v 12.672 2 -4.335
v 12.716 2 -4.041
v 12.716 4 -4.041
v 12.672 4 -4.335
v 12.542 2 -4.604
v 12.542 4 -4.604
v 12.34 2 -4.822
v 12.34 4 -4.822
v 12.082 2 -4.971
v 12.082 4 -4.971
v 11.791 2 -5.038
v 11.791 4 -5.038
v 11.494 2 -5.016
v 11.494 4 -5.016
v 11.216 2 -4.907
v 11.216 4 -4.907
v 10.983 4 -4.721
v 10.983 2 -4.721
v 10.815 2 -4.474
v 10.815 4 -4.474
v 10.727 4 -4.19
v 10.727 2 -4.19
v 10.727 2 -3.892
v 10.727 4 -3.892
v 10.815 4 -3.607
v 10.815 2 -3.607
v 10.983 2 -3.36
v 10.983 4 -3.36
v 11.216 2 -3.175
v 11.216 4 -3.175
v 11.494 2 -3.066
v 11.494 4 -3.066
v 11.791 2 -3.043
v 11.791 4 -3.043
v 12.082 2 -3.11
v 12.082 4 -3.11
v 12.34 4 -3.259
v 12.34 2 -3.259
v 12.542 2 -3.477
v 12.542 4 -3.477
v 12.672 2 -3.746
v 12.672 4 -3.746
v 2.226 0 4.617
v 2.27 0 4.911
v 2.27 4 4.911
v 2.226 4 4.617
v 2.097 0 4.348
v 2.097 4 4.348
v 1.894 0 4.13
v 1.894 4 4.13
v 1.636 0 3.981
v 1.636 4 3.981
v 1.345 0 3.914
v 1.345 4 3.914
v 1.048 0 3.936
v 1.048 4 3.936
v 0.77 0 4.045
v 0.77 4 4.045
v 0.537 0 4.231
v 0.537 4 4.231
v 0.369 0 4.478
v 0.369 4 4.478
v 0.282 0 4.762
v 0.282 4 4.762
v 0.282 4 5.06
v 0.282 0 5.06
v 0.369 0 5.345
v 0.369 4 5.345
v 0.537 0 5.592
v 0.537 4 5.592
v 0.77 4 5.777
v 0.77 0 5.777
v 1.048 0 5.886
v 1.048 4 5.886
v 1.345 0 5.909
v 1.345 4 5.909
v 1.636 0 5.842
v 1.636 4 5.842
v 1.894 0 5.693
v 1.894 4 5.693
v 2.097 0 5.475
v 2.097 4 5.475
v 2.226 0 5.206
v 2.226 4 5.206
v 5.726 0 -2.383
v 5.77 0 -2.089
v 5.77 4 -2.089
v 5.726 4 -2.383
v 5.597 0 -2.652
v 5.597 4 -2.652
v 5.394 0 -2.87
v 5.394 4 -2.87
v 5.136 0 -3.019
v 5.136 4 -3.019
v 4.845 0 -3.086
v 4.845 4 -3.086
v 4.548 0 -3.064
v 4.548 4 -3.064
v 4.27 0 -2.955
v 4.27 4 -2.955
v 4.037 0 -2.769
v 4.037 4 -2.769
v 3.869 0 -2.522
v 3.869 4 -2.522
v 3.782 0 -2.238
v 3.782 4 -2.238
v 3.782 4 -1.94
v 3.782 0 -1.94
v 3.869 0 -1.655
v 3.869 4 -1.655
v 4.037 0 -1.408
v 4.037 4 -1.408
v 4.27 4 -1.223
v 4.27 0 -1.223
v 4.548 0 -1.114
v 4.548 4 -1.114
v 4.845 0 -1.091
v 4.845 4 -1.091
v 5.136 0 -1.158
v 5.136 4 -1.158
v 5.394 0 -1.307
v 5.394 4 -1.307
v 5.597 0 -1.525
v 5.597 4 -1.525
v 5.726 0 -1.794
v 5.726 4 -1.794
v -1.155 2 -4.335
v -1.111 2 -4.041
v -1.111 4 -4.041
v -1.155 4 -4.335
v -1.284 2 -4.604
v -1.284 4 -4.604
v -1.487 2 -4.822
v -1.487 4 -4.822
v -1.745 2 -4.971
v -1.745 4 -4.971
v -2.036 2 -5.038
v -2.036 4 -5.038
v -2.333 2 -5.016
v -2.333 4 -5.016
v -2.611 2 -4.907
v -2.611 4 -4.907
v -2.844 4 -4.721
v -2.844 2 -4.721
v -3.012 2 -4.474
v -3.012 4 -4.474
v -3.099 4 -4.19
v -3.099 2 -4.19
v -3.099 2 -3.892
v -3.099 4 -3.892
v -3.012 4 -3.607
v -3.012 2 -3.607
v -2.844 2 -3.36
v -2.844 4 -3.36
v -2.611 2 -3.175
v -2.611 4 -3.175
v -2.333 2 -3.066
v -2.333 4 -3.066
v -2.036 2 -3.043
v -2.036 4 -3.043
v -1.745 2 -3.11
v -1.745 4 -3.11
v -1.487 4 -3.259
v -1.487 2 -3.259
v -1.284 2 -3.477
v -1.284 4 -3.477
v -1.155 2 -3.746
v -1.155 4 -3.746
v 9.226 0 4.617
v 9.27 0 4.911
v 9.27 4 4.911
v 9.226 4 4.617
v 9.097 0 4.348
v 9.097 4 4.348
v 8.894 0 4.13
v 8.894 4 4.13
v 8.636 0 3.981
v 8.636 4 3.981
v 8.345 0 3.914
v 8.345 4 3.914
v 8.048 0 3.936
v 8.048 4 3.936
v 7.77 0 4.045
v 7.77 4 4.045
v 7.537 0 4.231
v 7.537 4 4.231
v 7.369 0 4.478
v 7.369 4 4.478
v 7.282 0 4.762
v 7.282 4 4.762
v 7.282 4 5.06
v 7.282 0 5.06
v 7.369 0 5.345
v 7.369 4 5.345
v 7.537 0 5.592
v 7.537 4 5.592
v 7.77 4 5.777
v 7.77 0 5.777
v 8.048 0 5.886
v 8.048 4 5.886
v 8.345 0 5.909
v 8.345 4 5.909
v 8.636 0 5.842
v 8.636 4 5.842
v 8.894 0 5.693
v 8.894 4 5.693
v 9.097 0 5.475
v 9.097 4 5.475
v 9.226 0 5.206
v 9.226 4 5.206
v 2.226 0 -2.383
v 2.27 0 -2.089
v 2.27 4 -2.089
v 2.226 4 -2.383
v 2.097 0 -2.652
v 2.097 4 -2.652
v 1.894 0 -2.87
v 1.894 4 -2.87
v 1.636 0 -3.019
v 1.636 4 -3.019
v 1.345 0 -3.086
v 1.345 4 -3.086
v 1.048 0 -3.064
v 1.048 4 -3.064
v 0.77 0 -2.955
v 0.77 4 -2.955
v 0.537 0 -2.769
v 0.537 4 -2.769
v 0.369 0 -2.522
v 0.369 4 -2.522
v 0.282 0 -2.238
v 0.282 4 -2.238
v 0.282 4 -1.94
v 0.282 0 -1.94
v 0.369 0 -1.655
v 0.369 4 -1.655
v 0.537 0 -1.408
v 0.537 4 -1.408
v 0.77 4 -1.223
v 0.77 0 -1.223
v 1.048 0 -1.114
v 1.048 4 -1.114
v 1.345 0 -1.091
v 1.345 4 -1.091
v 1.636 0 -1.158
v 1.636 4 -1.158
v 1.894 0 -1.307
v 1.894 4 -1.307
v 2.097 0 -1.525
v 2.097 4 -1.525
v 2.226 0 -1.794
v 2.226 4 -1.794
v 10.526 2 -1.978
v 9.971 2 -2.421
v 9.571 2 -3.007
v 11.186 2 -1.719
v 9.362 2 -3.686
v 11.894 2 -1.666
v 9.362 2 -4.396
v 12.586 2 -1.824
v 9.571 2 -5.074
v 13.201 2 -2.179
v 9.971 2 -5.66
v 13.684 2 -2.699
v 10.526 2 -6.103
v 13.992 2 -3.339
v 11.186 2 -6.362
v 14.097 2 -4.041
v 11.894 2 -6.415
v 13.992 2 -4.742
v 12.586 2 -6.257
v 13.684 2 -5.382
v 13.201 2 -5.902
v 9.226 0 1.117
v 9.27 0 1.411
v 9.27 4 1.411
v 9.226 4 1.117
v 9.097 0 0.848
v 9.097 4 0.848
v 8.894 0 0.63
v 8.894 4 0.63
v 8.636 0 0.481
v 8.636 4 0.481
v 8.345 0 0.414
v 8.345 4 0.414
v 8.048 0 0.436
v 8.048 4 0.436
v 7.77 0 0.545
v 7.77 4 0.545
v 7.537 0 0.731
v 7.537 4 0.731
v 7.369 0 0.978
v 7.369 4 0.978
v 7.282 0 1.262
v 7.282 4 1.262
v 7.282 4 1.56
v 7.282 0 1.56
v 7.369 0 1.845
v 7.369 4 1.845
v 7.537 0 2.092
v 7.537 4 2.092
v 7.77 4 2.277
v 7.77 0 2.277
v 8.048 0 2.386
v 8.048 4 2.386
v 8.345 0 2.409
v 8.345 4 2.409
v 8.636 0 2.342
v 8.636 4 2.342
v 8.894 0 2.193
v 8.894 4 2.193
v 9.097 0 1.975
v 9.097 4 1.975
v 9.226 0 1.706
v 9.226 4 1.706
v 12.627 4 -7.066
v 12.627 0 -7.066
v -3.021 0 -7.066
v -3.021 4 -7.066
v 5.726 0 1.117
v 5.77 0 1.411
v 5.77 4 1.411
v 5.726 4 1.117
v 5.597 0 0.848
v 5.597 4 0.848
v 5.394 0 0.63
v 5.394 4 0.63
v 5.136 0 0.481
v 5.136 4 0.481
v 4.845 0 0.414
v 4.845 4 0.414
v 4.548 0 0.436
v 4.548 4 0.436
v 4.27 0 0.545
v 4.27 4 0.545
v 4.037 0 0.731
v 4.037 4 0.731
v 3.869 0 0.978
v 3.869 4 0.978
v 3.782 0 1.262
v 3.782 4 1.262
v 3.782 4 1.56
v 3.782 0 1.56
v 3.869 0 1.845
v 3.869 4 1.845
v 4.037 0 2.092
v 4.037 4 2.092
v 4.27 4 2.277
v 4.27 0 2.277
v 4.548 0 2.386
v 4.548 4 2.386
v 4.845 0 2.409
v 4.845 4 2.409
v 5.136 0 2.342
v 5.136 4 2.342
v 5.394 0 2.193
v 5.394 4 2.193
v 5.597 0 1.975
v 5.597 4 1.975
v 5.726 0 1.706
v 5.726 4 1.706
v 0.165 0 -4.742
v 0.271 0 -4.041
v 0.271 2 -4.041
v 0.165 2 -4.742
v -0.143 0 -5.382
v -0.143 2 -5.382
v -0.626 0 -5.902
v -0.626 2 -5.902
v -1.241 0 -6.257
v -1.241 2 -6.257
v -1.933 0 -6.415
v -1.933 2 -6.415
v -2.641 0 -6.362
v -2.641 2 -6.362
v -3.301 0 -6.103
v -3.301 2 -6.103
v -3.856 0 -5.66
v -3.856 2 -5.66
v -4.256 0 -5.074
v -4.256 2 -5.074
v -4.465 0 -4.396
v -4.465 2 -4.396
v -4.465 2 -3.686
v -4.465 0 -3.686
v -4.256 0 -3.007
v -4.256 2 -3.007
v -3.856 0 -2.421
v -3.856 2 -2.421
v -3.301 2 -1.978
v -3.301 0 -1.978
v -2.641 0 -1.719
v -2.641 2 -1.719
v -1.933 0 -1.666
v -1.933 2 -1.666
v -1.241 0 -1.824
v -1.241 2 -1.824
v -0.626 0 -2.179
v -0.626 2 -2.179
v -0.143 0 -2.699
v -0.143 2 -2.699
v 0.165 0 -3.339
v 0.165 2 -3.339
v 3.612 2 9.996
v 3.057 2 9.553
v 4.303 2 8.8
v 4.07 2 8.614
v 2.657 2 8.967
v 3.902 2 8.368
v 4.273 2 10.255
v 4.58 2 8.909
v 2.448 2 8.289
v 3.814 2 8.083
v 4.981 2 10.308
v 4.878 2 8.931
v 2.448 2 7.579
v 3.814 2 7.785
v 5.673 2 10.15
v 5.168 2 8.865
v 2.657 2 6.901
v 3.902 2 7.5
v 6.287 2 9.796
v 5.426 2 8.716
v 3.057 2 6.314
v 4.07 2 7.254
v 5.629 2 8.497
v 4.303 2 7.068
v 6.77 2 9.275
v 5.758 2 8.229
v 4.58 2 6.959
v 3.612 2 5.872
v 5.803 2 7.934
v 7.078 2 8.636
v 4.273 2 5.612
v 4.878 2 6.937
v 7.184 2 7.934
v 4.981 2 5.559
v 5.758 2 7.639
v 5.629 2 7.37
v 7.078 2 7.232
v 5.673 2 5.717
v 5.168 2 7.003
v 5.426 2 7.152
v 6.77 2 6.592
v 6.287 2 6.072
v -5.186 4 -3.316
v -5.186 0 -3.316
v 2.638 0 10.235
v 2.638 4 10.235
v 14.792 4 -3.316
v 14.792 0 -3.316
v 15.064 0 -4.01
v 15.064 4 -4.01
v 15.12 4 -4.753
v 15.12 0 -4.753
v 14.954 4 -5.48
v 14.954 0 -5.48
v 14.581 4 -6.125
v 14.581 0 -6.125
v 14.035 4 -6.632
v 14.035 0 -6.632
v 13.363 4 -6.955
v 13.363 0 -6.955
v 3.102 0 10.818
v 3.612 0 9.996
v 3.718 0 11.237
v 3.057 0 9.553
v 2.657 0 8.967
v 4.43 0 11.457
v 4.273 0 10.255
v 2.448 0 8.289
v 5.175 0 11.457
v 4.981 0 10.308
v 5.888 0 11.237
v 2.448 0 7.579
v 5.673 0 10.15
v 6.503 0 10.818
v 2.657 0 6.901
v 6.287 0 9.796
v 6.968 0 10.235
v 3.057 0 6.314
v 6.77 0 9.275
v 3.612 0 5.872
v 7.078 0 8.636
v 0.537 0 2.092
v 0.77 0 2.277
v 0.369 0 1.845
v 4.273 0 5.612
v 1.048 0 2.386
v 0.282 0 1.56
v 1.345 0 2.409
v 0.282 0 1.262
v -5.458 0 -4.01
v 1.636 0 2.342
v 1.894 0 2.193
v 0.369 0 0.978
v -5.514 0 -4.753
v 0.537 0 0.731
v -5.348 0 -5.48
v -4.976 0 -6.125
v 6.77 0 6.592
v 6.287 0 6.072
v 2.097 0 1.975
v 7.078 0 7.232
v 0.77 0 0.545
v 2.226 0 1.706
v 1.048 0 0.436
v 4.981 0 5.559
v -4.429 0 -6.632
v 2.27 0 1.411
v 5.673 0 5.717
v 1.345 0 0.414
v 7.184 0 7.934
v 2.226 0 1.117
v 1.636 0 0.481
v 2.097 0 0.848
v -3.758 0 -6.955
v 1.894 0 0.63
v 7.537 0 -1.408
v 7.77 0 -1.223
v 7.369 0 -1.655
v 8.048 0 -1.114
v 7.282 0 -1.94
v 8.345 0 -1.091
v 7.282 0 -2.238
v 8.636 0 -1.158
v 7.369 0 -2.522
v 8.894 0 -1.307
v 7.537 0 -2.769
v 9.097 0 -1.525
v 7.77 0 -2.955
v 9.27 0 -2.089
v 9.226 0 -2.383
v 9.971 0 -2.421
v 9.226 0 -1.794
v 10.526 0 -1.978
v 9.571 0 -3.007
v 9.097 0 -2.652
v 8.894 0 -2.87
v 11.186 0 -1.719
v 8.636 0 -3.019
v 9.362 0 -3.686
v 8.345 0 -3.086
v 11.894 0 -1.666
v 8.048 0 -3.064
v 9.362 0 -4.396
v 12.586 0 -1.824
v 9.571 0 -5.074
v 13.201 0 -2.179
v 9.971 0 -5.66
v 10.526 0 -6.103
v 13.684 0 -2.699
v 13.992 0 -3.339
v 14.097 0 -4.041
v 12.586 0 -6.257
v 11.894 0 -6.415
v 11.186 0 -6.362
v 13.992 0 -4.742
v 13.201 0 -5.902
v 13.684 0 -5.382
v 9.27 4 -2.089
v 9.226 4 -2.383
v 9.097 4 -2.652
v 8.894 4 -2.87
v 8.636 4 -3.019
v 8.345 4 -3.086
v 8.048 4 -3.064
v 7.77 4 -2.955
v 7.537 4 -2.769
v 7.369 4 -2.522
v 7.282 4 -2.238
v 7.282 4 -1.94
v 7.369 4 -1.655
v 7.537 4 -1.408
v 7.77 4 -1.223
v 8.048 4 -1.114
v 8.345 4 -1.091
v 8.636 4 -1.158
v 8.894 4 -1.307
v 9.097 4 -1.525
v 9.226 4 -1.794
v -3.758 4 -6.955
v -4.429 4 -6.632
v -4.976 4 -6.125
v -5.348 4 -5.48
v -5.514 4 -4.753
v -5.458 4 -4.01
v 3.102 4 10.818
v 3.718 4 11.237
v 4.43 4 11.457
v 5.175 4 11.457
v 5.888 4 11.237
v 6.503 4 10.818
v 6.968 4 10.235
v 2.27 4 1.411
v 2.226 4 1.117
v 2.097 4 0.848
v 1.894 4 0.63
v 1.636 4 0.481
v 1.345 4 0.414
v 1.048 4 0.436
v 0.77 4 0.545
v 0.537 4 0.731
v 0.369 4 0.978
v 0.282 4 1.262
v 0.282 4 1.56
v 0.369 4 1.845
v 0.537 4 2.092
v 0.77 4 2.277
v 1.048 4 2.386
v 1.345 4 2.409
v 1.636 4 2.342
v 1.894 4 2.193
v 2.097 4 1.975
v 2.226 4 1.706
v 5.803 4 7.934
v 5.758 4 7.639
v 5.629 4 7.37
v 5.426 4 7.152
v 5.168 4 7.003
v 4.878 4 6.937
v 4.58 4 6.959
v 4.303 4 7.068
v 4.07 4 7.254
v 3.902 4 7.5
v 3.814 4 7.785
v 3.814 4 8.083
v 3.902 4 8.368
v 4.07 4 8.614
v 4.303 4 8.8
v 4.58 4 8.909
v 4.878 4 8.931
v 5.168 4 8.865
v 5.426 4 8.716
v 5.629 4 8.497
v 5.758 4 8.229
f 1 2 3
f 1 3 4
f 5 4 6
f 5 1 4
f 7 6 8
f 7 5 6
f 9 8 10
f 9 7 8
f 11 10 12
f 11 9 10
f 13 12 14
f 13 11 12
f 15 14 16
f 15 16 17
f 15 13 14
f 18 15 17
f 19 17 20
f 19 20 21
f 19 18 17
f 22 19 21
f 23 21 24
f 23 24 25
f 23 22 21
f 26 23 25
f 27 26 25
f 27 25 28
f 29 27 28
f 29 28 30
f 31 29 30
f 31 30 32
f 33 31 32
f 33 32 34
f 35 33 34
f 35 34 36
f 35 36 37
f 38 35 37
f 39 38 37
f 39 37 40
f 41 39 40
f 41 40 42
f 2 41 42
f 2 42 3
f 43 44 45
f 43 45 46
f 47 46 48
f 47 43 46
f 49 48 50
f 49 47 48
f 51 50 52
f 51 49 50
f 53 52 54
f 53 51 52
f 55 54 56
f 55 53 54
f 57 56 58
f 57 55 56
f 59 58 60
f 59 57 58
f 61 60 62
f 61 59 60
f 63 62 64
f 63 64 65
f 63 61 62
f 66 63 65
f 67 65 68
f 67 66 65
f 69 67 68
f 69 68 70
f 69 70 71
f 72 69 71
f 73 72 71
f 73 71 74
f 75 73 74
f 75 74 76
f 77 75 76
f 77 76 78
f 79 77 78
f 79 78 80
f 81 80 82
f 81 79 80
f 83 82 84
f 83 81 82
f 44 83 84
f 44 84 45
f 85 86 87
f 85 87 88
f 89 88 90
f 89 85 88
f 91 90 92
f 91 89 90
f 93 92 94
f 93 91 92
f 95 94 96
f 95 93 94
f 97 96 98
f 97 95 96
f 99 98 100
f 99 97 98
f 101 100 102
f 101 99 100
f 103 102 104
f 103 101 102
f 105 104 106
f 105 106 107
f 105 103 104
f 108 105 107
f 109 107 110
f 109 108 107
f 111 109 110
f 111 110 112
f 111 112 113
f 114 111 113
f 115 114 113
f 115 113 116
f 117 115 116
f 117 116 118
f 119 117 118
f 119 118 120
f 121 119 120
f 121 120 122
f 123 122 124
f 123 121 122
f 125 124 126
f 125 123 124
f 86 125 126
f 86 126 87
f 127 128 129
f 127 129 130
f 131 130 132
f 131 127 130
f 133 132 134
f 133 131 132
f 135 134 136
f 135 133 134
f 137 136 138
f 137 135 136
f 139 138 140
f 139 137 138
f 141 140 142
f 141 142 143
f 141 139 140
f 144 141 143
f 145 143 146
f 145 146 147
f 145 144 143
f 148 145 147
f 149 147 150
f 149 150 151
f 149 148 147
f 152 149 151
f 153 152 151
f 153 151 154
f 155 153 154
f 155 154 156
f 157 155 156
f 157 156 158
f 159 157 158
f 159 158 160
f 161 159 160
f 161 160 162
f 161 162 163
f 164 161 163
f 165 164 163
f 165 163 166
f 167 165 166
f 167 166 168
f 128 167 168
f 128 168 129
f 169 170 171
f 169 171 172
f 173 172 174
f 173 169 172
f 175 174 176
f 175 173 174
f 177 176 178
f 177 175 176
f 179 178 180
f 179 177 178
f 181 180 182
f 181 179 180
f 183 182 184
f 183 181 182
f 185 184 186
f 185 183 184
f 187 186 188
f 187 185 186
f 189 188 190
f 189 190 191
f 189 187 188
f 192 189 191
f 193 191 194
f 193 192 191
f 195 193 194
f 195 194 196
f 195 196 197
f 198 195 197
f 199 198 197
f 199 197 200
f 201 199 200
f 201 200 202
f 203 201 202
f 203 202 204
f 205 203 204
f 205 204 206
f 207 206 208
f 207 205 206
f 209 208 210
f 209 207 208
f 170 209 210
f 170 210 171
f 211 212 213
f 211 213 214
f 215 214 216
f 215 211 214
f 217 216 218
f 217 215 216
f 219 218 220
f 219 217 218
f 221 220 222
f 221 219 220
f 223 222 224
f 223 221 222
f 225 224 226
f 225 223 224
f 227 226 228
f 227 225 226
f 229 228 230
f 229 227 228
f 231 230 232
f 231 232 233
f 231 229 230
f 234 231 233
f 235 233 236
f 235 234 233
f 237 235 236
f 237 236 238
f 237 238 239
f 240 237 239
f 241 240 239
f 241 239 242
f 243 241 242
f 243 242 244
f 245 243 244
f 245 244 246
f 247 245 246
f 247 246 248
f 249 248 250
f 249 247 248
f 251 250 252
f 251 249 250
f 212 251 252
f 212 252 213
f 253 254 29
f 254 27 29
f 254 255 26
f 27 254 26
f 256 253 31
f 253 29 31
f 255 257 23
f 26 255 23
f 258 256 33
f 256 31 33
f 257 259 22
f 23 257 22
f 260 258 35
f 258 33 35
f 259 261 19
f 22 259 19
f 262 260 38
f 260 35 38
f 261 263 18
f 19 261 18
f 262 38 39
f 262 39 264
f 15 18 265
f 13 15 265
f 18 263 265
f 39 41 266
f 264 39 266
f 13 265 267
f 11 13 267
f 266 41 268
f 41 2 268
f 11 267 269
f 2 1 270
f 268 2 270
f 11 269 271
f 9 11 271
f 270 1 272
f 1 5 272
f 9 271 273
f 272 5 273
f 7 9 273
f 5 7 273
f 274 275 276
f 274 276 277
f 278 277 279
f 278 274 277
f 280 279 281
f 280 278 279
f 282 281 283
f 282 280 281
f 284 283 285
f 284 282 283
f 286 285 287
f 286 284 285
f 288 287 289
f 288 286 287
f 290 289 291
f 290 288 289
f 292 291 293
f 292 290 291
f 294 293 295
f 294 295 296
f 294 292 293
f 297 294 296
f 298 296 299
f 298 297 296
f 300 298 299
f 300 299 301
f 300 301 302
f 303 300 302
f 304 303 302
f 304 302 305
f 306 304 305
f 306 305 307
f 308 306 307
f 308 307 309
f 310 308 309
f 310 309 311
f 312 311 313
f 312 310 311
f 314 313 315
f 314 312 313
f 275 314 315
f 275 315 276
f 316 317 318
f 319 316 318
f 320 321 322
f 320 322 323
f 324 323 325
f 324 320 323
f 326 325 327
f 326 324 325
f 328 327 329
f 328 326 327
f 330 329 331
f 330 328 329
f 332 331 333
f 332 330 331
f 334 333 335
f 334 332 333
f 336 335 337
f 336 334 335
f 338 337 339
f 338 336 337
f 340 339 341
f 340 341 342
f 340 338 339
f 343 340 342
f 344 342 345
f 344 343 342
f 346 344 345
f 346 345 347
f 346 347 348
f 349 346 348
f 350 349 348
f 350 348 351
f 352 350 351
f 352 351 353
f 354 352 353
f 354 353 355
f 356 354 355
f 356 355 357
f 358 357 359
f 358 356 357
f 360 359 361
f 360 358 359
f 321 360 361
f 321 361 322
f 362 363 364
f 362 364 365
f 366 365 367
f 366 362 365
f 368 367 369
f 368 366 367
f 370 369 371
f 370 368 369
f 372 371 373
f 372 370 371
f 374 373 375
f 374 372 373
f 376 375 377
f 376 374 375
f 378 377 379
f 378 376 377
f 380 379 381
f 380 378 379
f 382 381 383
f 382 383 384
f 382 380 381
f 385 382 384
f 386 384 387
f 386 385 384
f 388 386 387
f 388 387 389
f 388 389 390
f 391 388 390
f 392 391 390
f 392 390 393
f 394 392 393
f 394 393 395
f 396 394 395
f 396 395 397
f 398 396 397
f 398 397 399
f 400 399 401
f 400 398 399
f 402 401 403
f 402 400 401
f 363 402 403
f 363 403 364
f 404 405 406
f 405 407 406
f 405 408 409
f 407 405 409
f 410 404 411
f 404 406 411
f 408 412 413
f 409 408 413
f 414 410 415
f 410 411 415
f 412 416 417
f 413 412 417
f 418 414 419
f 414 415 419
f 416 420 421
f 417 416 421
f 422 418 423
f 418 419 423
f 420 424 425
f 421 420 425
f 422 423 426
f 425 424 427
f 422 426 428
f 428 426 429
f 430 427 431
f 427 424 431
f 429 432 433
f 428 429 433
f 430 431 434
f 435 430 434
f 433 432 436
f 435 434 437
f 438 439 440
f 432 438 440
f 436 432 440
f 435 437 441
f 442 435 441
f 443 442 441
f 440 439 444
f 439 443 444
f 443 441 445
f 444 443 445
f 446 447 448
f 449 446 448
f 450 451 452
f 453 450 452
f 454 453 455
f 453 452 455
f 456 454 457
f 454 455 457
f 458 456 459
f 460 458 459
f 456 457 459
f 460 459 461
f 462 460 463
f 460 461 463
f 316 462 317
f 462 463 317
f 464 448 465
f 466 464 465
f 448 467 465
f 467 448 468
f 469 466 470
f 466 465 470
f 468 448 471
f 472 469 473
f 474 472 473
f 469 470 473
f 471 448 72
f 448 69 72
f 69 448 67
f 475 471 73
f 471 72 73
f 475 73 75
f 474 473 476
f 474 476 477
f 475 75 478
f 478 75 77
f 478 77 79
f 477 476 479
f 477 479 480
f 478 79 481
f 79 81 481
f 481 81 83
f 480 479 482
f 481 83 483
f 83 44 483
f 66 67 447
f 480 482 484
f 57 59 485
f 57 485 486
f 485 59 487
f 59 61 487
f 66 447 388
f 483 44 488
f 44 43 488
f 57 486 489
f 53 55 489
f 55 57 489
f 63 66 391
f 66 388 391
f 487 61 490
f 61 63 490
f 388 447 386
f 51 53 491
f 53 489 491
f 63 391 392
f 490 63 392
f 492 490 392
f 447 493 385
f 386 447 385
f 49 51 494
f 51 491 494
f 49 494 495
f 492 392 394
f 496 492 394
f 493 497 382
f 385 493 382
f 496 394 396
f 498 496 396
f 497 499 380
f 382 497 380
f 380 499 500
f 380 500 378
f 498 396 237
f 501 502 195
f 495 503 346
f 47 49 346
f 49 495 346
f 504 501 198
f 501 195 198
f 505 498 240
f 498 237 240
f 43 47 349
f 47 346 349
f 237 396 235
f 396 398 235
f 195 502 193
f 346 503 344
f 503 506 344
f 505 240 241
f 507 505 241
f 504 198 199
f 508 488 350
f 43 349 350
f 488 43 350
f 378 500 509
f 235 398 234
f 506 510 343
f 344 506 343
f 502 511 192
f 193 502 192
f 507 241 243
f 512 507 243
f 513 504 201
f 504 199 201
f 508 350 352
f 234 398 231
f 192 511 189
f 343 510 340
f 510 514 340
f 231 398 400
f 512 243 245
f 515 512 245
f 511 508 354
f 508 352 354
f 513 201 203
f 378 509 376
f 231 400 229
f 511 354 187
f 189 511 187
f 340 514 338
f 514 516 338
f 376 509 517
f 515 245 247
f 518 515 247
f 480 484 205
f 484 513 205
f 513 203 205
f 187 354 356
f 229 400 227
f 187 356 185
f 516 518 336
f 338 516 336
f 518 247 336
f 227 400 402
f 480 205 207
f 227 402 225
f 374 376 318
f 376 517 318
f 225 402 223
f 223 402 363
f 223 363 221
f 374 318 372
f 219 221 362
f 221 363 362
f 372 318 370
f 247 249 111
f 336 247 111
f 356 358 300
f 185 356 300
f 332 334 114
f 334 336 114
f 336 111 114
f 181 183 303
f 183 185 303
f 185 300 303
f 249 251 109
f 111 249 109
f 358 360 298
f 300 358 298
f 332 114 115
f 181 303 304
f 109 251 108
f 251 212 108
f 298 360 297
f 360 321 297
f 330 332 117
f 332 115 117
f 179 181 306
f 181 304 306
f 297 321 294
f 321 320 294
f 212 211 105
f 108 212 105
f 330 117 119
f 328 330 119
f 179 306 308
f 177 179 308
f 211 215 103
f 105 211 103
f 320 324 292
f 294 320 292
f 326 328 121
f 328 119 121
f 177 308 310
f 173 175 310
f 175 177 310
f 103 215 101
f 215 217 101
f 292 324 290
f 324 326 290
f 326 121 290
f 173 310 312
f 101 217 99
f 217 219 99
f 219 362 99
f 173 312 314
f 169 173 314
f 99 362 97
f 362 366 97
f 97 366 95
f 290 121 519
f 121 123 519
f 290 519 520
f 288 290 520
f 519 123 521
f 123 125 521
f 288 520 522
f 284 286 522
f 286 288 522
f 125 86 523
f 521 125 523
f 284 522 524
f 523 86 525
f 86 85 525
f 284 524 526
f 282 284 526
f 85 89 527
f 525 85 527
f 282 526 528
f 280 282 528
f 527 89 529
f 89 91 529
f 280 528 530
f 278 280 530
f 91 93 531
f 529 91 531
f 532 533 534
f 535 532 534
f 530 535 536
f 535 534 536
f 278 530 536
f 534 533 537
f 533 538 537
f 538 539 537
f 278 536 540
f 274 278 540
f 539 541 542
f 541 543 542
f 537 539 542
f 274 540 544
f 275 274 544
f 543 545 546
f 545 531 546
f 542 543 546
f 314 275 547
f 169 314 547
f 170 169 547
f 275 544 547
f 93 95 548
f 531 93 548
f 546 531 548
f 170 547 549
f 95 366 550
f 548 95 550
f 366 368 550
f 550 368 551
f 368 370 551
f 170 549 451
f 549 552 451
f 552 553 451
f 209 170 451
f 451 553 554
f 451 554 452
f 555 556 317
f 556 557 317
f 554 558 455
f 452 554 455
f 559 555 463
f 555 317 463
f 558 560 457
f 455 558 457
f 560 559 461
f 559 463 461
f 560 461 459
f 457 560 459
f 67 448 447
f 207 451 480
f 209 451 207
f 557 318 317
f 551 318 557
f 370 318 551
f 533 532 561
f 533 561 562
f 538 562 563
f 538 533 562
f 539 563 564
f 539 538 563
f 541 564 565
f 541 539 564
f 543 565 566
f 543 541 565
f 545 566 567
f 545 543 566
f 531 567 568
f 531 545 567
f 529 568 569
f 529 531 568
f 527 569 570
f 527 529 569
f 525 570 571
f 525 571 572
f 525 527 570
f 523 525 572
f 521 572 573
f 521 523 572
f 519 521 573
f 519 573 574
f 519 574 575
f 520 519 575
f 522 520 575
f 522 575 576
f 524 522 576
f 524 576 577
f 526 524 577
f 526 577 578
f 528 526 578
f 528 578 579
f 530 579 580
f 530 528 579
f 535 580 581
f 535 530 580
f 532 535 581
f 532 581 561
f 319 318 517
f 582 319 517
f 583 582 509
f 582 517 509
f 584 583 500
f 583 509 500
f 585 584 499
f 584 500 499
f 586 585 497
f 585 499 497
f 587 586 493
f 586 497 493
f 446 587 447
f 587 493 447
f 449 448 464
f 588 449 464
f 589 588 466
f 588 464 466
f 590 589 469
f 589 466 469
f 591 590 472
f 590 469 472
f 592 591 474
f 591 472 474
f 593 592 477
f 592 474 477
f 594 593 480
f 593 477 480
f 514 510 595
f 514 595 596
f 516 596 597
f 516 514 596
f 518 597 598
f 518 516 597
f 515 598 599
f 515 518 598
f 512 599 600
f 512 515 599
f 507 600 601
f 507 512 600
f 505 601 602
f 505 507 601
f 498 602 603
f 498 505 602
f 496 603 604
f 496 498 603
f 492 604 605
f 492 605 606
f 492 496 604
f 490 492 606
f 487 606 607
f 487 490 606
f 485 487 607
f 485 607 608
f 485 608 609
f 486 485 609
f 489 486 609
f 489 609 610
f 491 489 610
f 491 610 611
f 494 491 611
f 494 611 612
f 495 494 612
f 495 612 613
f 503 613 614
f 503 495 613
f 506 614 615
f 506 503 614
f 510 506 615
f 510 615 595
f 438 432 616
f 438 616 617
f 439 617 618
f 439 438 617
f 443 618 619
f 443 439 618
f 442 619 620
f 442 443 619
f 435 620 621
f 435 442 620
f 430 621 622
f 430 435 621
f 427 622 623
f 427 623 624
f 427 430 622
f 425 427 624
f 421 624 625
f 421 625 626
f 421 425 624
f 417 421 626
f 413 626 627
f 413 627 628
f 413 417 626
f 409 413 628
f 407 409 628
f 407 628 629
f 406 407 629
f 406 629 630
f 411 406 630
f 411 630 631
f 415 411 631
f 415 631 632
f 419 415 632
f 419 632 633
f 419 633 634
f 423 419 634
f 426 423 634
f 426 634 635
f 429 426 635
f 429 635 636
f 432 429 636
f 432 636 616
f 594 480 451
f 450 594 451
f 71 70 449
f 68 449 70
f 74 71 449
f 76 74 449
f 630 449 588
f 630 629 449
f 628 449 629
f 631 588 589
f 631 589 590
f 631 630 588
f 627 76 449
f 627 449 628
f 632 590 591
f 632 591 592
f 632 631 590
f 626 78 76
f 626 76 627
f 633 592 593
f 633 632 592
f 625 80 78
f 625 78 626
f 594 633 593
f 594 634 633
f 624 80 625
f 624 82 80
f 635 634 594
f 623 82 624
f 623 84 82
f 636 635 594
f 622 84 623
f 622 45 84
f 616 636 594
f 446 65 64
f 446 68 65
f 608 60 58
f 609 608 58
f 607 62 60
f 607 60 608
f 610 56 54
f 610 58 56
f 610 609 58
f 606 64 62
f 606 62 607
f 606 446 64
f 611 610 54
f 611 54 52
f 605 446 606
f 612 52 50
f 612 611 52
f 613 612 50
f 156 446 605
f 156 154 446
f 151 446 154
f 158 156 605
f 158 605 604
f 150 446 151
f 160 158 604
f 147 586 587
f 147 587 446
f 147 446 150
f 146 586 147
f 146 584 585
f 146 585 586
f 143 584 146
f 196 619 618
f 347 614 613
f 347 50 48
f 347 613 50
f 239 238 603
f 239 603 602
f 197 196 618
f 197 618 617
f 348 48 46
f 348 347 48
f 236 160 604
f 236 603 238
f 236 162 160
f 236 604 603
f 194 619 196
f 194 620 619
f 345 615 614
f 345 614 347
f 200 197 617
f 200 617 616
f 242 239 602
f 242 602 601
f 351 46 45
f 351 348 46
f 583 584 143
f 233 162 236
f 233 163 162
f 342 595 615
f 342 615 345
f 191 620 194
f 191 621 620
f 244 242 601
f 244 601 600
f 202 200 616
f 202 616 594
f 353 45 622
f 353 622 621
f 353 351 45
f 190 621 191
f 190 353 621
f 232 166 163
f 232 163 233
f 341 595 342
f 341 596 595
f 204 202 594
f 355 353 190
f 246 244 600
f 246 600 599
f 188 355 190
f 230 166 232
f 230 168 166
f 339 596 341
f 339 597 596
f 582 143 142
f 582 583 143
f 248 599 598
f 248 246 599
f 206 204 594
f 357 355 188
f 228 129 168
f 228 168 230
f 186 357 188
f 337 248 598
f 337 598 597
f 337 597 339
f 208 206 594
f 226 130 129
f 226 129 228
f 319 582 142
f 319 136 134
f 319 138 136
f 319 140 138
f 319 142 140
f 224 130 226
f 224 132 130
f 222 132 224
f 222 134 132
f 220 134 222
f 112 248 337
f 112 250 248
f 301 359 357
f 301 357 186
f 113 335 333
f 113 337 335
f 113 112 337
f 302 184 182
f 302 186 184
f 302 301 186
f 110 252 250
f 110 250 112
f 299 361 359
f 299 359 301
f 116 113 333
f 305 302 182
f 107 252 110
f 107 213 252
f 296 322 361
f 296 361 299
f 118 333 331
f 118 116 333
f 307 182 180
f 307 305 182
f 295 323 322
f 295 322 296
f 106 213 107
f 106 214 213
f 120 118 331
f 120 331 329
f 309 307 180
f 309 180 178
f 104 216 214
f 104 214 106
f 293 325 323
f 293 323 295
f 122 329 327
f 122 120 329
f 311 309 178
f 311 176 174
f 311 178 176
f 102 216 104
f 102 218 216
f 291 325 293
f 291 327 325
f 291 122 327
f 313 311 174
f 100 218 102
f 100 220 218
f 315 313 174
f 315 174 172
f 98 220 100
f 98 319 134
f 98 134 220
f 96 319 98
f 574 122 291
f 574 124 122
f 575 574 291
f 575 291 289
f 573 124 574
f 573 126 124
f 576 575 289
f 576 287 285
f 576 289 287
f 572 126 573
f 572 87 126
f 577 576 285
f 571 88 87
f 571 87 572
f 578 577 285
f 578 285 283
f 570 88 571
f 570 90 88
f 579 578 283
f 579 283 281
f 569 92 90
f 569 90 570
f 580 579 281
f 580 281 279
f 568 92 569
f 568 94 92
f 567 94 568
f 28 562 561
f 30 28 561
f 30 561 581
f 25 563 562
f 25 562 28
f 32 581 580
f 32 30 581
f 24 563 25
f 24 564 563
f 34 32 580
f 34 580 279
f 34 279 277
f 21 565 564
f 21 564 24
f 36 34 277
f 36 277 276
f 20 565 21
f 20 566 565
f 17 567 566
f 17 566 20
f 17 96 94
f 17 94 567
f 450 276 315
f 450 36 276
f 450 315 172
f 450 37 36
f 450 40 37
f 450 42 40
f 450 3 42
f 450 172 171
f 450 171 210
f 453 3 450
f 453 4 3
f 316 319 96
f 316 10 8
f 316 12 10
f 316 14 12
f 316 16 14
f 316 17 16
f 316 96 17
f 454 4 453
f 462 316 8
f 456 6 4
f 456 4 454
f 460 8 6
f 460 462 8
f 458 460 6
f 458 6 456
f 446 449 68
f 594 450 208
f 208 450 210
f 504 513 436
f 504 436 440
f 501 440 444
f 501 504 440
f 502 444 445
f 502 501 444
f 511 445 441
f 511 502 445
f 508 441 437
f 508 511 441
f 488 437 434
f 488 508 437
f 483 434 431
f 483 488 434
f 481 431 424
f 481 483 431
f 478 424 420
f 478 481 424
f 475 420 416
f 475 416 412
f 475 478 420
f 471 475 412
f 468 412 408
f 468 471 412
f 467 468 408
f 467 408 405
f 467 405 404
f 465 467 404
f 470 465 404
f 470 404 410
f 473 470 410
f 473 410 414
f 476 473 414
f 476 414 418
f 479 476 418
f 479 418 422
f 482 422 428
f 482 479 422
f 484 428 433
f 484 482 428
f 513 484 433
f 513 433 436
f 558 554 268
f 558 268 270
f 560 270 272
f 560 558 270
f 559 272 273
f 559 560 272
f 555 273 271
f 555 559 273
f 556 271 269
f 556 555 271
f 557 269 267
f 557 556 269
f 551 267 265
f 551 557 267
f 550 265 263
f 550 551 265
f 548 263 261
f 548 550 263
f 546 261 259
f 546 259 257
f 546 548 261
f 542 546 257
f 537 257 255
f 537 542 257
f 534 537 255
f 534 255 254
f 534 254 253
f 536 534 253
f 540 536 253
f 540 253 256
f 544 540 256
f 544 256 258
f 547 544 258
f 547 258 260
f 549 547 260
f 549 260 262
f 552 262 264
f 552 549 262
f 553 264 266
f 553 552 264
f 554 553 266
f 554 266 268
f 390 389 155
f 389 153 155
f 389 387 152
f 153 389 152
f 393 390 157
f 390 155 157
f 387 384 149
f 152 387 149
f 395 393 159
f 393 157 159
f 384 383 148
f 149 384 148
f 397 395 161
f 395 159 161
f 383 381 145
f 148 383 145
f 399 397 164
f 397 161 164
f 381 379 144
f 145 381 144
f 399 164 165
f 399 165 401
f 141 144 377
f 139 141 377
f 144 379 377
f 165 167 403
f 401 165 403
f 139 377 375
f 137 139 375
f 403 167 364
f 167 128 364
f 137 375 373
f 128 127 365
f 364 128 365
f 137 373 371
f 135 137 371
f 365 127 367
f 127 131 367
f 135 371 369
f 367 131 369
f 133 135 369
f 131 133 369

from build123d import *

# Parameters (mm, degrees)
SKETCH1_R      = 1
EXTRUDE1_DEPTH = 4
SKETCH1_3_R    = 2.38125
EXTRUDE4_DEPTH = 2


with BuildPart() as part:
    # Sketch1 → Extrude1 (new body)
    with BuildSketch(Plane(origin=(0, 0, 0), x_dir=(1, 0, 0), z_dir=(0, 1, 0))):
        with BuildLine():
            Line((-5.186041147, 3.316192399), (2.637731834, -10.234979911))
            ThreePointArc((2.637731834, -10.234979911), (4.802795343, -11.484979911), (6.967858853, -10.234979911))
            Line((6.967858853, -10.234979911), (14.791631834, 3.316192399))
            ThreePointArc((14.791631834, 3.316192399), (14.791631834, 5.816192399), (12.626568324, 7.066192399))
            Line((12.626568324, 7.066192399), (-3.020977638, 7.066192399))
            ThreePointArc((-3.020977638, 7.066192399), (-5.186041147, 5.816192399), (-5.186041147, 3.316192399))
        make_face()
        with Locations((-2.110635714, 4.040606244)):
            Circle(SKETCH1_R, mode=Mode.SUBTRACT)
        with Locations((11.7162264, 4.040606244)):
            Circle(SKETCH1_R, mode=Mode.SUBTRACT)
        with Locations((4.802795343, -7.933807601)):
            Circle(SKETCH1_R, mode=Mode.SUBTRACT)
        with Locations((1.270334632, 2.088602105)):
            Circle(SKETCH1_R, mode=Mode.SUBTRACT)
        with Locations((4.770334632, 2.088602105)):
            Circle(SKETCH1_R, mode=Mode.SUBTRACT)
        with Locations((8.270334632, 2.088602105)):
            Circle(SKETCH1_R, mode=Mode.SUBTRACT)
        with Locations((1.270334632, -1.411397895)):
            Circle(SKETCH1_R, mode=Mode.SUBTRACT)
        with Locations((4.770334632, -1.411397895)):
            Circle(SKETCH1_R, mode=Mode.SUBTRACT)
        with Locations((8.270334632, -1.411397895)):
            Circle(SKETCH1_R, mode=Mode.SUBTRACT)
        with Locations((1.270334632, -4.911397895)):
            Circle(SKETCH1_R, mode=Mode.SUBTRACT)
        with Locations((8.270334632, -4.911397895)):
            Circle(SKETCH1_R, mode=Mode.SUBTRACT)
    extrude(amount=EXTRUDE1_DEPTH)

    # Sketch1<3> → Extrude4 (cut)
    with BuildSketch(Plane(origin=(0, 0, 0), x_dir=(1, 0, 0), z_dir=(0, 1, 0))):
        with Locations((-2.110635714, 4.040606244)):
            Circle(SKETCH1_3_R)
        with Locations((4.802795343, -7.933807601)):
            Circle(SKETCH1_3_R)
        with Locations((11.7162264, 4.040606244)):
            Circle(SKETCH1_3_R)
    extrude(amount=EXTRUDE4_DEPTH, mode=Mode.SUBTRACT)


solid = part.part
